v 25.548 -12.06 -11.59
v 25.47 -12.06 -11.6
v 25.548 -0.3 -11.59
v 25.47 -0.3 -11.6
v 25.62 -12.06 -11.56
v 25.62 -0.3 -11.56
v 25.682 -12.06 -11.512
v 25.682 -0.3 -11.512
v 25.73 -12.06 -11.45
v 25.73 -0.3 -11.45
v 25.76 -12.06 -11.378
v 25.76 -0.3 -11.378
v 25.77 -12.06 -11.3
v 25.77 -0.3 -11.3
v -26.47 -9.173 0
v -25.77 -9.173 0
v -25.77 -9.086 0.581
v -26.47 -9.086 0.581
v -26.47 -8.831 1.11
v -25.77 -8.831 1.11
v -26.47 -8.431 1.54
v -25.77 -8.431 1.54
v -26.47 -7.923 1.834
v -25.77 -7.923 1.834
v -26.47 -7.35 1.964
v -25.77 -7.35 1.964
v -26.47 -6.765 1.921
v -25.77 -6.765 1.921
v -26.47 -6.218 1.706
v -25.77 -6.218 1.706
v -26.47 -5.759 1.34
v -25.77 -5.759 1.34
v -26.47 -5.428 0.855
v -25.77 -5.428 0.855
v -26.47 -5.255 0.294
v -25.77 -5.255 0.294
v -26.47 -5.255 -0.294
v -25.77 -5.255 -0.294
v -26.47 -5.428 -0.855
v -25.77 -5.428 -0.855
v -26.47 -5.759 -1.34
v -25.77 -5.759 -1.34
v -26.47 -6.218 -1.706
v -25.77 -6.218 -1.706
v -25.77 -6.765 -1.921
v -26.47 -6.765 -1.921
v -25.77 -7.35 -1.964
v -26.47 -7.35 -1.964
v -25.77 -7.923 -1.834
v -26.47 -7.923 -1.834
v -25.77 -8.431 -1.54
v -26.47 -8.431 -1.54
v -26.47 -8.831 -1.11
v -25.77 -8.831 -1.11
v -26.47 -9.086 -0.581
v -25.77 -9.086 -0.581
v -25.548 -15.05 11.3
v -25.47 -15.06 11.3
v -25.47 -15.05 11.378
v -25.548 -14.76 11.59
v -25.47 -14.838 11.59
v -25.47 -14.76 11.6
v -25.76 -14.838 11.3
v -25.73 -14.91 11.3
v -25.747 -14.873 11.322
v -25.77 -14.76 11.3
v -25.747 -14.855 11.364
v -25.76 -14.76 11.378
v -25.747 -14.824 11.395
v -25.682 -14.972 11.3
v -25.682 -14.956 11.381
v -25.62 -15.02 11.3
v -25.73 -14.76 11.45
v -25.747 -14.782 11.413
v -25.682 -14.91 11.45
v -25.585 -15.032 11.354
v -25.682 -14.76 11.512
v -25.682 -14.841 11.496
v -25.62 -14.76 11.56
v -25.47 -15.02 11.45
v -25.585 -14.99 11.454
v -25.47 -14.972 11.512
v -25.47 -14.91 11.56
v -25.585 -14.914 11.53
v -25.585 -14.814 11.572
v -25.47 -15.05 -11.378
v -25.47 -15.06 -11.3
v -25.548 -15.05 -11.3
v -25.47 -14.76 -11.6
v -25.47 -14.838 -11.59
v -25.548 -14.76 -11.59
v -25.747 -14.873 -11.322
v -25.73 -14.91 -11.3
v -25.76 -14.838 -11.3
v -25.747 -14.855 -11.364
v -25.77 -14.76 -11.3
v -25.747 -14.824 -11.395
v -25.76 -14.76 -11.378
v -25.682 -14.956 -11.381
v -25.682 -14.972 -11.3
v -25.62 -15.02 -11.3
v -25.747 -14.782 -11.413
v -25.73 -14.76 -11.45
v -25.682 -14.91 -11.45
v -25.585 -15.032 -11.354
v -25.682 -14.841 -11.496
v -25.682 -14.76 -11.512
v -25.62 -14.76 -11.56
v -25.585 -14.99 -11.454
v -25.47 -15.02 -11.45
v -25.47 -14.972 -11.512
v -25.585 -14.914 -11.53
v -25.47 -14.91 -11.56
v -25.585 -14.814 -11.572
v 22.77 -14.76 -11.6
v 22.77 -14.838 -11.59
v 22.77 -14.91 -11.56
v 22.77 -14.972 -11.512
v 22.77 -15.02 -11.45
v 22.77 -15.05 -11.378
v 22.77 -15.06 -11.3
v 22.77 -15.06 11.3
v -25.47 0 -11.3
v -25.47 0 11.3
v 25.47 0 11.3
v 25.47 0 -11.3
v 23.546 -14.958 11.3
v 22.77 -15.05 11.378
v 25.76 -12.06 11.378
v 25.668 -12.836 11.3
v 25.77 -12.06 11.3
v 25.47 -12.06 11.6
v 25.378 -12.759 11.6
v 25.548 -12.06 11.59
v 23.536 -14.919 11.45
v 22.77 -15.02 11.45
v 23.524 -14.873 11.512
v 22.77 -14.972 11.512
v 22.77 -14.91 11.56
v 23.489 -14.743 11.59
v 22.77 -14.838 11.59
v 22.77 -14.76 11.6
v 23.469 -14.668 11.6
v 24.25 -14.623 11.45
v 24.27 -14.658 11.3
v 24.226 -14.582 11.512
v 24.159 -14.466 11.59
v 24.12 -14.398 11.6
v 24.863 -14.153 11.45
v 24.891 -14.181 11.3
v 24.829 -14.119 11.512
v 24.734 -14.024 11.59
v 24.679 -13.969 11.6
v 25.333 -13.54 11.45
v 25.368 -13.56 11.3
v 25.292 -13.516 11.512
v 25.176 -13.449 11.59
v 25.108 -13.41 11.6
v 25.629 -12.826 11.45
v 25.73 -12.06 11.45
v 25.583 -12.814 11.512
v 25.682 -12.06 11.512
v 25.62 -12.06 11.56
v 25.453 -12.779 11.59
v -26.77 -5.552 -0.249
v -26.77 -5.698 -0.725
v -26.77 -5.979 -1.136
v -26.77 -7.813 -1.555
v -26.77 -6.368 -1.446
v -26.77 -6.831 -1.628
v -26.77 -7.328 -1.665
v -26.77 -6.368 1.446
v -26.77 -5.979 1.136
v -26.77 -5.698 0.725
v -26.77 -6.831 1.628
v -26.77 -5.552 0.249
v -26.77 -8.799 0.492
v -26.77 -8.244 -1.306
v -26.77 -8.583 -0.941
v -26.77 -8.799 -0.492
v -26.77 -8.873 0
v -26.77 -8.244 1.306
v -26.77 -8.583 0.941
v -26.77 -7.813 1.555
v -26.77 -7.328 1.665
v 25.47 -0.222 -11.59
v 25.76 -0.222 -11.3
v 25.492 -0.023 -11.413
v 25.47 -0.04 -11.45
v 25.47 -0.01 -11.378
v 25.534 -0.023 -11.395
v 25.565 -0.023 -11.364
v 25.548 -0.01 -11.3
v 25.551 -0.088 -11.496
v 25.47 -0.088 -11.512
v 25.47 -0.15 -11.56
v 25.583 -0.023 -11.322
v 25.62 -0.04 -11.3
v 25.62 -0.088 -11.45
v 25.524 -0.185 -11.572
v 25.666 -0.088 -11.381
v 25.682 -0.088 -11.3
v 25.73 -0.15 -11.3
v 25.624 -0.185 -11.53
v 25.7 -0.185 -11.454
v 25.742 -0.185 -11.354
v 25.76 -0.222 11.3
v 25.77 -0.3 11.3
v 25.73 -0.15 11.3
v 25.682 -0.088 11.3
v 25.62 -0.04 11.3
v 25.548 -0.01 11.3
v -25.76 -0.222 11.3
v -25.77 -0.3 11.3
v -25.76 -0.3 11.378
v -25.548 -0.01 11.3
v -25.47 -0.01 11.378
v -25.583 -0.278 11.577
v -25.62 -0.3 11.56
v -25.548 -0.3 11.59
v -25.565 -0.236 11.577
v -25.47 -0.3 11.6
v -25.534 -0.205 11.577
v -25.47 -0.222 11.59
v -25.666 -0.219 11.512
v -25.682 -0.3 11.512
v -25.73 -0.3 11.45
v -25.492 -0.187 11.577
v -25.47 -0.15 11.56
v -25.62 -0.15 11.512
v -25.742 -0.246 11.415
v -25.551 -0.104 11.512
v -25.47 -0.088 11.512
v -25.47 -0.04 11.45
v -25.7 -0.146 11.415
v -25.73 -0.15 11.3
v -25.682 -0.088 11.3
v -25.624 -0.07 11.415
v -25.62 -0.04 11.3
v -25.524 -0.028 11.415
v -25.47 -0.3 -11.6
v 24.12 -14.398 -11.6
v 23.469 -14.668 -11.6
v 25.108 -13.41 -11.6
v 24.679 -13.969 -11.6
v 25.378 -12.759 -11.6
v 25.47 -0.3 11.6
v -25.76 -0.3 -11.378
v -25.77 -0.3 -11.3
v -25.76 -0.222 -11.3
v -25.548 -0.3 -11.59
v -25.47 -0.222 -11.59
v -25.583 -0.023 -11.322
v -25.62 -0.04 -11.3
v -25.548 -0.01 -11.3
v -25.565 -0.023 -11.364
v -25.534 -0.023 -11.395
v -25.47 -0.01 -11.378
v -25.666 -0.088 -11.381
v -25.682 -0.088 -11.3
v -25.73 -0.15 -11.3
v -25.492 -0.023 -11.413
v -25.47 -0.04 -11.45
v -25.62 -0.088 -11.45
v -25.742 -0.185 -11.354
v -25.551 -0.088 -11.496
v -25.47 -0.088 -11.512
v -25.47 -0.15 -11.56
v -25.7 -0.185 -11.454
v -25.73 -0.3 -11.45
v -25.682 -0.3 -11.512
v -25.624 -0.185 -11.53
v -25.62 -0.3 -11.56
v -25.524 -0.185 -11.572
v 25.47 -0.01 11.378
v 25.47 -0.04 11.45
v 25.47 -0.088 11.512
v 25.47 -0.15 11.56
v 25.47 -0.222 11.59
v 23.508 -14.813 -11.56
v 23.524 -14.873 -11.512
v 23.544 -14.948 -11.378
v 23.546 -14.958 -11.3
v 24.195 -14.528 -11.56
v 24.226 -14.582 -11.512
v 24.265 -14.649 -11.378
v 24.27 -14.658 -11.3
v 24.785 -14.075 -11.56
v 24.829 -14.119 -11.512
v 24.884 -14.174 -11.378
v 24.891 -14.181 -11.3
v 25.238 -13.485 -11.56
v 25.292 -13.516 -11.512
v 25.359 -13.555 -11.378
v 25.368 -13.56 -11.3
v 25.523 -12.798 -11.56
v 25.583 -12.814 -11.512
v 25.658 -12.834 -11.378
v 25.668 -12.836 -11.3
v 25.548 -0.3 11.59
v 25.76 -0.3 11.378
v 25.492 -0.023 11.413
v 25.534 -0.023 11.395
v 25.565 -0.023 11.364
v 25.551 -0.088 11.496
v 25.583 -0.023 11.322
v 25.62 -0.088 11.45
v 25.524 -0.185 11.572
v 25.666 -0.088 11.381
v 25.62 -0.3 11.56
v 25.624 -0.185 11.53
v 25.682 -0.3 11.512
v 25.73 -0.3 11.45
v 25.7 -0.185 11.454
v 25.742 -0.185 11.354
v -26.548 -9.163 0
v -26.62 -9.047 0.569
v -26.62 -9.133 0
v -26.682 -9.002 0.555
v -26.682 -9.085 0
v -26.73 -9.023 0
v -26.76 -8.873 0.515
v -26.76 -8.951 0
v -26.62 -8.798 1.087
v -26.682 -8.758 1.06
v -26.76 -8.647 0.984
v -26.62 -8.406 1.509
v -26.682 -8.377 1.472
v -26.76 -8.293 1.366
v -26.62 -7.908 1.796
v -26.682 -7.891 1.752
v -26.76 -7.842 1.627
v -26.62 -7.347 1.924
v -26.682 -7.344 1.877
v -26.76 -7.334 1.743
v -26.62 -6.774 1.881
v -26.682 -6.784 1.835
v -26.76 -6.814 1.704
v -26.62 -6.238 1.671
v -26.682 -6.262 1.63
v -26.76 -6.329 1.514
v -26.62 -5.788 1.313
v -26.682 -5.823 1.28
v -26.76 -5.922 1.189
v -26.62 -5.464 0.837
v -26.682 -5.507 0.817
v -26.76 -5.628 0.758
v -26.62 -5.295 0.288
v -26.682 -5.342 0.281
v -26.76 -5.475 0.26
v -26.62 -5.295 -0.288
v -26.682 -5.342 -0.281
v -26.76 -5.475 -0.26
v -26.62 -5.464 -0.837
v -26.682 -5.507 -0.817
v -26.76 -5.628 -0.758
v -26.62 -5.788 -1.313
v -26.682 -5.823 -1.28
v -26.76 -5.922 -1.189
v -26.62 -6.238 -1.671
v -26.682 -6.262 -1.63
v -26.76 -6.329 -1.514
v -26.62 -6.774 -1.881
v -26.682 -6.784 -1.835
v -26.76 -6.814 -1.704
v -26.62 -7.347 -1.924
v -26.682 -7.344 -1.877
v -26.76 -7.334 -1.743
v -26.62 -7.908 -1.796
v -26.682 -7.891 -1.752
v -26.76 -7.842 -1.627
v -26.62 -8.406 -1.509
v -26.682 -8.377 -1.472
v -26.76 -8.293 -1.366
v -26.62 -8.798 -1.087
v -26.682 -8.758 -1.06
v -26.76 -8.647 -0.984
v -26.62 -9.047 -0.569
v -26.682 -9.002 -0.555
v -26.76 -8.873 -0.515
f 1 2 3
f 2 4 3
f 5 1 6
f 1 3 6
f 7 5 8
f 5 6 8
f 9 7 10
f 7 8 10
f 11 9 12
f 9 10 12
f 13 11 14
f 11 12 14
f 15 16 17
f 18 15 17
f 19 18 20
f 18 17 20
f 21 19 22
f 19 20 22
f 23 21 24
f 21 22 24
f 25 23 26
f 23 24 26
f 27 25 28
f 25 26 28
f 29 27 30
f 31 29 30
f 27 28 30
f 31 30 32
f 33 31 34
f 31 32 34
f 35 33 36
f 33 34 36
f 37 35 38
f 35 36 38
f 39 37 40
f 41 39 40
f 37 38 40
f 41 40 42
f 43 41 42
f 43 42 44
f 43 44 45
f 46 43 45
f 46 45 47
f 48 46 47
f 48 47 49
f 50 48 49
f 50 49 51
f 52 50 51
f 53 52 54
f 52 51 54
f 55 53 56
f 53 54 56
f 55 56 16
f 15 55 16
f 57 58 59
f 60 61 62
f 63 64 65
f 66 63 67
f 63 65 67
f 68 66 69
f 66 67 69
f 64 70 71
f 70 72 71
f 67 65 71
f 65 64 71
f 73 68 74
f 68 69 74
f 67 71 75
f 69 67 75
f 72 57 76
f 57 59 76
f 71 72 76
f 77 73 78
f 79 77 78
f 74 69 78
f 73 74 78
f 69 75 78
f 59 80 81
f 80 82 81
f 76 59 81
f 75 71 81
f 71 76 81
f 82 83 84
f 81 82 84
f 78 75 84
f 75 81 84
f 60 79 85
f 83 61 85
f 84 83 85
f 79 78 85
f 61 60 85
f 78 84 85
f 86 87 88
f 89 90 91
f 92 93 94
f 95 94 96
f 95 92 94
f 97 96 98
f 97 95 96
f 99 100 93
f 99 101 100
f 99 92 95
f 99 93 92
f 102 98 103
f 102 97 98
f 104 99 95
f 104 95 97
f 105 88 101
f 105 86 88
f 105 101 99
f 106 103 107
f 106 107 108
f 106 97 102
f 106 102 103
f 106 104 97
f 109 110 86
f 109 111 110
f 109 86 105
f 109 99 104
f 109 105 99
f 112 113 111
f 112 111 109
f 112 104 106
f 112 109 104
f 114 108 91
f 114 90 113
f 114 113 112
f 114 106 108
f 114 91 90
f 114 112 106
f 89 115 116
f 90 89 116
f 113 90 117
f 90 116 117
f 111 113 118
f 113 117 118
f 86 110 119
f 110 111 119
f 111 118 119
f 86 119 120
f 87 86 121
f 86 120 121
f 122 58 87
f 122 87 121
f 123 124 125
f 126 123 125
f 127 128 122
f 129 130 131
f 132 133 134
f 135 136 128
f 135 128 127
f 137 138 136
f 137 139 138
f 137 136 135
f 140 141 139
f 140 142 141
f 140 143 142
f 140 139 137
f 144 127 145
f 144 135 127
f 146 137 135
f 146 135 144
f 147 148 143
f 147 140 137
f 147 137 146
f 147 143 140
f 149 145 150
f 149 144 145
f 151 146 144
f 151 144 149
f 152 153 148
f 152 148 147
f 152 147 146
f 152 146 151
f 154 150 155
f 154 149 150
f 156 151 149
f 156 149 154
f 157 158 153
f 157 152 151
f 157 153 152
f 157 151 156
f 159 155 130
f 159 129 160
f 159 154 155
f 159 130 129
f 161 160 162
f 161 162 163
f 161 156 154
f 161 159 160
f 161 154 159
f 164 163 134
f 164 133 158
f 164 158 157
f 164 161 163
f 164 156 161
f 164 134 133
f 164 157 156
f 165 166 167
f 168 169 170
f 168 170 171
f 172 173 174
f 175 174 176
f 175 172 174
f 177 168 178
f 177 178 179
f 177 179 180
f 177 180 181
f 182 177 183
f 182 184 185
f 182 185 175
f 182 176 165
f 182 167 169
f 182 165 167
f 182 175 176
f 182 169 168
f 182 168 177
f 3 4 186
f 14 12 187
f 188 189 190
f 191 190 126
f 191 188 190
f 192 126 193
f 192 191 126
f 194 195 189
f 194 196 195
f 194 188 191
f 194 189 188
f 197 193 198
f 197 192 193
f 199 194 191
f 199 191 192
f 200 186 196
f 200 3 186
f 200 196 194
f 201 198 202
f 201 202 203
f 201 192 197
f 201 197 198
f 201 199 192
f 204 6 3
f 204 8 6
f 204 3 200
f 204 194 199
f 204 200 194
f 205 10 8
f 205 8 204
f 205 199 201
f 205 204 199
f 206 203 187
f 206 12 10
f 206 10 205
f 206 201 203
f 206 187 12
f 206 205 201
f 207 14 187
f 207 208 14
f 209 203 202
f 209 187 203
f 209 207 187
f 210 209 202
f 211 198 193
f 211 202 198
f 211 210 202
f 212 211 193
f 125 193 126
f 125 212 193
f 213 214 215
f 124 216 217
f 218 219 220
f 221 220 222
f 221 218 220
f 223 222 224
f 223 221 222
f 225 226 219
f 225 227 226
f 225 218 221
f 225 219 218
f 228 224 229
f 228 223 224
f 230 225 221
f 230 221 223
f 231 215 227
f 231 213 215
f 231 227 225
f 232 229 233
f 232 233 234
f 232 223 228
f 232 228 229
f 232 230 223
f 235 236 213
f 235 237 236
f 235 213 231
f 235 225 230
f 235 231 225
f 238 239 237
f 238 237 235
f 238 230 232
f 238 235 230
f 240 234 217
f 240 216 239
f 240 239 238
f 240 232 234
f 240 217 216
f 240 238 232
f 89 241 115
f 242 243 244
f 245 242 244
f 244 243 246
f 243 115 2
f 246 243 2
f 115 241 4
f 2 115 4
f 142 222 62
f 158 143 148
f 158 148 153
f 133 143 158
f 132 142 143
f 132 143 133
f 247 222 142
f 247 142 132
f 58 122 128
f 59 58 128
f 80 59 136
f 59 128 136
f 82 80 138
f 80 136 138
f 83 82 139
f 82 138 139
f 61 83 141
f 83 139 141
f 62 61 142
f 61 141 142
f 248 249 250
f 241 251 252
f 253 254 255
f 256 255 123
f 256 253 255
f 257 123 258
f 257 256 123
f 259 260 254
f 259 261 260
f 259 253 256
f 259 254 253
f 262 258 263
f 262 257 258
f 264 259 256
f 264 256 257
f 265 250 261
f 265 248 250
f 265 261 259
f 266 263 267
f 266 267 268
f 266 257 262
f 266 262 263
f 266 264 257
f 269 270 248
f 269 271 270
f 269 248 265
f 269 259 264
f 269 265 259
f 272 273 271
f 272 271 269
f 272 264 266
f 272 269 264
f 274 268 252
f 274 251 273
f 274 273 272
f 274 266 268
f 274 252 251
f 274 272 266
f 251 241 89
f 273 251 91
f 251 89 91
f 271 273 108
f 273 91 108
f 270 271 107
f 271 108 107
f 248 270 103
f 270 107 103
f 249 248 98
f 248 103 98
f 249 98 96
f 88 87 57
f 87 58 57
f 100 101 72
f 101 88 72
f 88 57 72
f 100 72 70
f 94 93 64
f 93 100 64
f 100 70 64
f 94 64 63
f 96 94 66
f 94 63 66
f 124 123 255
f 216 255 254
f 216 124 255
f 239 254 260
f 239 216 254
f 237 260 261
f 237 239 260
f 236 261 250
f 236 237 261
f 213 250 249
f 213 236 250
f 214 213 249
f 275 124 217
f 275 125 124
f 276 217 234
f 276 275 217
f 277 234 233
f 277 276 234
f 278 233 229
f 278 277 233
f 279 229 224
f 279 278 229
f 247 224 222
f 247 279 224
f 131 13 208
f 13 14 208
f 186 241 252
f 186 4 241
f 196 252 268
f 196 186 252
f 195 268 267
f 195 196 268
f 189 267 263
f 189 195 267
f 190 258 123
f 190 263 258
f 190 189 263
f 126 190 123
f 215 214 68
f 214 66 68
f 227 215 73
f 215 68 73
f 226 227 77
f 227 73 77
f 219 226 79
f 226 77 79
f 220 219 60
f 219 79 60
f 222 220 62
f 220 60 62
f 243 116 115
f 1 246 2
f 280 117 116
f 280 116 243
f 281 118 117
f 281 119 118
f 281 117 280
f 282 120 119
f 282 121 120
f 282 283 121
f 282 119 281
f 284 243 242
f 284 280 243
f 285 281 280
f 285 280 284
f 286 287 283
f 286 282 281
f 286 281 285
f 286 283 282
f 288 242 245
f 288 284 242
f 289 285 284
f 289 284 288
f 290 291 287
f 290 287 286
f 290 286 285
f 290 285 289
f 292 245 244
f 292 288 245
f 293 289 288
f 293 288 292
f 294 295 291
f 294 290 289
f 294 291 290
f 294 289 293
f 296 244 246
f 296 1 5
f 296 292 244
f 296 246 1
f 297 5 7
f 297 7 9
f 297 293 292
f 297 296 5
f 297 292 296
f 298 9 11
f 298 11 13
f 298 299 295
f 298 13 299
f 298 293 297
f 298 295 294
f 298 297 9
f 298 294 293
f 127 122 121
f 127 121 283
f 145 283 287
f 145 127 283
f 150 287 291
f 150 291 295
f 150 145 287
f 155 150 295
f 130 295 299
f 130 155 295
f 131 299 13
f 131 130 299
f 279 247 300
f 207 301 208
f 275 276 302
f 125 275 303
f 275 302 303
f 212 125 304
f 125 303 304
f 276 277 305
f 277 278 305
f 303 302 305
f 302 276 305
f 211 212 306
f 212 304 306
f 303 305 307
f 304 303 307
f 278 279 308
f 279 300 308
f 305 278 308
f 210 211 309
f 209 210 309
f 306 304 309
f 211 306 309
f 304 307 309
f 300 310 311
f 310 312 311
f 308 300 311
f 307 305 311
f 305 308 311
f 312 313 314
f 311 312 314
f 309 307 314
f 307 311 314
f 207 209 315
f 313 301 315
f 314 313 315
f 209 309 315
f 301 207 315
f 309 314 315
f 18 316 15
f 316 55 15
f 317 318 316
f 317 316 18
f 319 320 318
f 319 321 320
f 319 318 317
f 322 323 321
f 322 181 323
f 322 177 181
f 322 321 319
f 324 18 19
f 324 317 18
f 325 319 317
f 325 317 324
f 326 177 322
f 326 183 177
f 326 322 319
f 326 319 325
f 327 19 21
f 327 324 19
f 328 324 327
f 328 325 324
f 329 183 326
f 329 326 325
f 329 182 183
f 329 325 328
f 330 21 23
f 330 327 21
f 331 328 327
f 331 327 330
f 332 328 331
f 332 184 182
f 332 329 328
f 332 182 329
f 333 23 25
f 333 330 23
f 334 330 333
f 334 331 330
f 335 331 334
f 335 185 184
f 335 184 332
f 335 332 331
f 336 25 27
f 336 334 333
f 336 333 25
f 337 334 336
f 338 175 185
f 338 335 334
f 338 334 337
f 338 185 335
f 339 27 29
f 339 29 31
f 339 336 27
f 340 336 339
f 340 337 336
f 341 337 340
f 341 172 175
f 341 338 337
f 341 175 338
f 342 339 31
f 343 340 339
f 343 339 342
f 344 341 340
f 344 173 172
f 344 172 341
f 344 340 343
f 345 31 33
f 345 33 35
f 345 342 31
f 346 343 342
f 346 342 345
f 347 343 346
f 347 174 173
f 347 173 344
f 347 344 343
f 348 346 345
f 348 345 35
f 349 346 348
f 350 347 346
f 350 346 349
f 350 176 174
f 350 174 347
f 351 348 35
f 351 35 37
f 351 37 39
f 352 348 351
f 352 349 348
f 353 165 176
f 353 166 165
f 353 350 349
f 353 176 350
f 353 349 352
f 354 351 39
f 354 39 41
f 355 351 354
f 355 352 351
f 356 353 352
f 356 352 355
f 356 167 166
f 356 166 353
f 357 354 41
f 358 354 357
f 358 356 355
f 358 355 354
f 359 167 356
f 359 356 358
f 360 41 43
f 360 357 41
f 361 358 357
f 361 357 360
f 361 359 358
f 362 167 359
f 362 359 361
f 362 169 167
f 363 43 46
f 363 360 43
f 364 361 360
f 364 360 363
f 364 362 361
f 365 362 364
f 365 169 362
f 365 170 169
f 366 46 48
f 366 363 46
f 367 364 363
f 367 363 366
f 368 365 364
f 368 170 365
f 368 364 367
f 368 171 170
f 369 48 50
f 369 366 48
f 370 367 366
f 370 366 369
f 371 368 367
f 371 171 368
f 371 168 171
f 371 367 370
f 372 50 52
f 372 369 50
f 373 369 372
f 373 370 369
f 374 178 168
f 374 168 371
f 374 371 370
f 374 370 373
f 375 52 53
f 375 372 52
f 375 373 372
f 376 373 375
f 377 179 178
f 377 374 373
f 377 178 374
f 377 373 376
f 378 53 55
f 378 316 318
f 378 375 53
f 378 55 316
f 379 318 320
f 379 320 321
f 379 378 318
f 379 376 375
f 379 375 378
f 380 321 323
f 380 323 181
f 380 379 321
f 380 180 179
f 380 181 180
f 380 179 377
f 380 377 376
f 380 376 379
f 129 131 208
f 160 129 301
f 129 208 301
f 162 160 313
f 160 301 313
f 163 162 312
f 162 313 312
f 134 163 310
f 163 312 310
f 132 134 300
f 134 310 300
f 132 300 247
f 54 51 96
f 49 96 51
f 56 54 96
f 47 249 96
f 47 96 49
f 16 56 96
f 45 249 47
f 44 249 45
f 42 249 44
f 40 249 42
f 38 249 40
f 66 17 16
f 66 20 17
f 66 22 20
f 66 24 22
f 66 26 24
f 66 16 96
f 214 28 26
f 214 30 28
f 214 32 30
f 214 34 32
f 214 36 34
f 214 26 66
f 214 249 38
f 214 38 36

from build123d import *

# Parameters (mm, degrees)
F0_W     = 51.54
F0_H     = 23.2
F1_DEPTH = 15.06
F2_R     = 1.97
F3_DEPTH = 1
F4_R     = 0.3
F5_R     = 3
F6_R     = 0.3


with BuildPart() as f1:
    # F0 (on Front) → F1 (new body)
    with BuildSketch(Plane.XZ):
        Rectangle(F0_W, F0_H)
    extrude(amount=F1_DEPTH)

    # F2 (on face) → F3 (join)
    with BuildSketch(Plane(origin=(-25.77, 0, 0), x_dir=(0, -1, 0), z_dir=(-1, 0, 0))):
        with Locations((7.203062, 0)):
            Circle(F2_R)
    extrude(amount=F3_DEPTH)

    # F4
    f4_edges = [f1.edges().sort_by_distance(p)[0] for p in [
        (-26.77, -5.233062, 0),
    ]]
    fillet(f4_edges, radius=F4_R)

    # F5
    f5_edges = [f1.edges().sort_by_distance(p)[0] for p in [
        (25.77, -15.06, 0),
    ]]
    fillet(f5_edges, radius=F5_R)

    # F6
    f6_edges = [f1.edges().sort_by_distance(p)[0] for p in [
        (-1.5, -15.06, -11.6),
        (-1.5, -15.06, 11.6),
        (-25.77, -15.06, 0),
        (-25.77, -7.53, -11.6),
        (-25.77, 0, 0),
        (-25.77, -7.53, 11.6),
        (0, 0, -11.6),
        (0, 0, 11.6),
        (25.77, 0, 0),
    ]]
    fillet(f6_edges, radius=F6_R)


solid = f1.part
